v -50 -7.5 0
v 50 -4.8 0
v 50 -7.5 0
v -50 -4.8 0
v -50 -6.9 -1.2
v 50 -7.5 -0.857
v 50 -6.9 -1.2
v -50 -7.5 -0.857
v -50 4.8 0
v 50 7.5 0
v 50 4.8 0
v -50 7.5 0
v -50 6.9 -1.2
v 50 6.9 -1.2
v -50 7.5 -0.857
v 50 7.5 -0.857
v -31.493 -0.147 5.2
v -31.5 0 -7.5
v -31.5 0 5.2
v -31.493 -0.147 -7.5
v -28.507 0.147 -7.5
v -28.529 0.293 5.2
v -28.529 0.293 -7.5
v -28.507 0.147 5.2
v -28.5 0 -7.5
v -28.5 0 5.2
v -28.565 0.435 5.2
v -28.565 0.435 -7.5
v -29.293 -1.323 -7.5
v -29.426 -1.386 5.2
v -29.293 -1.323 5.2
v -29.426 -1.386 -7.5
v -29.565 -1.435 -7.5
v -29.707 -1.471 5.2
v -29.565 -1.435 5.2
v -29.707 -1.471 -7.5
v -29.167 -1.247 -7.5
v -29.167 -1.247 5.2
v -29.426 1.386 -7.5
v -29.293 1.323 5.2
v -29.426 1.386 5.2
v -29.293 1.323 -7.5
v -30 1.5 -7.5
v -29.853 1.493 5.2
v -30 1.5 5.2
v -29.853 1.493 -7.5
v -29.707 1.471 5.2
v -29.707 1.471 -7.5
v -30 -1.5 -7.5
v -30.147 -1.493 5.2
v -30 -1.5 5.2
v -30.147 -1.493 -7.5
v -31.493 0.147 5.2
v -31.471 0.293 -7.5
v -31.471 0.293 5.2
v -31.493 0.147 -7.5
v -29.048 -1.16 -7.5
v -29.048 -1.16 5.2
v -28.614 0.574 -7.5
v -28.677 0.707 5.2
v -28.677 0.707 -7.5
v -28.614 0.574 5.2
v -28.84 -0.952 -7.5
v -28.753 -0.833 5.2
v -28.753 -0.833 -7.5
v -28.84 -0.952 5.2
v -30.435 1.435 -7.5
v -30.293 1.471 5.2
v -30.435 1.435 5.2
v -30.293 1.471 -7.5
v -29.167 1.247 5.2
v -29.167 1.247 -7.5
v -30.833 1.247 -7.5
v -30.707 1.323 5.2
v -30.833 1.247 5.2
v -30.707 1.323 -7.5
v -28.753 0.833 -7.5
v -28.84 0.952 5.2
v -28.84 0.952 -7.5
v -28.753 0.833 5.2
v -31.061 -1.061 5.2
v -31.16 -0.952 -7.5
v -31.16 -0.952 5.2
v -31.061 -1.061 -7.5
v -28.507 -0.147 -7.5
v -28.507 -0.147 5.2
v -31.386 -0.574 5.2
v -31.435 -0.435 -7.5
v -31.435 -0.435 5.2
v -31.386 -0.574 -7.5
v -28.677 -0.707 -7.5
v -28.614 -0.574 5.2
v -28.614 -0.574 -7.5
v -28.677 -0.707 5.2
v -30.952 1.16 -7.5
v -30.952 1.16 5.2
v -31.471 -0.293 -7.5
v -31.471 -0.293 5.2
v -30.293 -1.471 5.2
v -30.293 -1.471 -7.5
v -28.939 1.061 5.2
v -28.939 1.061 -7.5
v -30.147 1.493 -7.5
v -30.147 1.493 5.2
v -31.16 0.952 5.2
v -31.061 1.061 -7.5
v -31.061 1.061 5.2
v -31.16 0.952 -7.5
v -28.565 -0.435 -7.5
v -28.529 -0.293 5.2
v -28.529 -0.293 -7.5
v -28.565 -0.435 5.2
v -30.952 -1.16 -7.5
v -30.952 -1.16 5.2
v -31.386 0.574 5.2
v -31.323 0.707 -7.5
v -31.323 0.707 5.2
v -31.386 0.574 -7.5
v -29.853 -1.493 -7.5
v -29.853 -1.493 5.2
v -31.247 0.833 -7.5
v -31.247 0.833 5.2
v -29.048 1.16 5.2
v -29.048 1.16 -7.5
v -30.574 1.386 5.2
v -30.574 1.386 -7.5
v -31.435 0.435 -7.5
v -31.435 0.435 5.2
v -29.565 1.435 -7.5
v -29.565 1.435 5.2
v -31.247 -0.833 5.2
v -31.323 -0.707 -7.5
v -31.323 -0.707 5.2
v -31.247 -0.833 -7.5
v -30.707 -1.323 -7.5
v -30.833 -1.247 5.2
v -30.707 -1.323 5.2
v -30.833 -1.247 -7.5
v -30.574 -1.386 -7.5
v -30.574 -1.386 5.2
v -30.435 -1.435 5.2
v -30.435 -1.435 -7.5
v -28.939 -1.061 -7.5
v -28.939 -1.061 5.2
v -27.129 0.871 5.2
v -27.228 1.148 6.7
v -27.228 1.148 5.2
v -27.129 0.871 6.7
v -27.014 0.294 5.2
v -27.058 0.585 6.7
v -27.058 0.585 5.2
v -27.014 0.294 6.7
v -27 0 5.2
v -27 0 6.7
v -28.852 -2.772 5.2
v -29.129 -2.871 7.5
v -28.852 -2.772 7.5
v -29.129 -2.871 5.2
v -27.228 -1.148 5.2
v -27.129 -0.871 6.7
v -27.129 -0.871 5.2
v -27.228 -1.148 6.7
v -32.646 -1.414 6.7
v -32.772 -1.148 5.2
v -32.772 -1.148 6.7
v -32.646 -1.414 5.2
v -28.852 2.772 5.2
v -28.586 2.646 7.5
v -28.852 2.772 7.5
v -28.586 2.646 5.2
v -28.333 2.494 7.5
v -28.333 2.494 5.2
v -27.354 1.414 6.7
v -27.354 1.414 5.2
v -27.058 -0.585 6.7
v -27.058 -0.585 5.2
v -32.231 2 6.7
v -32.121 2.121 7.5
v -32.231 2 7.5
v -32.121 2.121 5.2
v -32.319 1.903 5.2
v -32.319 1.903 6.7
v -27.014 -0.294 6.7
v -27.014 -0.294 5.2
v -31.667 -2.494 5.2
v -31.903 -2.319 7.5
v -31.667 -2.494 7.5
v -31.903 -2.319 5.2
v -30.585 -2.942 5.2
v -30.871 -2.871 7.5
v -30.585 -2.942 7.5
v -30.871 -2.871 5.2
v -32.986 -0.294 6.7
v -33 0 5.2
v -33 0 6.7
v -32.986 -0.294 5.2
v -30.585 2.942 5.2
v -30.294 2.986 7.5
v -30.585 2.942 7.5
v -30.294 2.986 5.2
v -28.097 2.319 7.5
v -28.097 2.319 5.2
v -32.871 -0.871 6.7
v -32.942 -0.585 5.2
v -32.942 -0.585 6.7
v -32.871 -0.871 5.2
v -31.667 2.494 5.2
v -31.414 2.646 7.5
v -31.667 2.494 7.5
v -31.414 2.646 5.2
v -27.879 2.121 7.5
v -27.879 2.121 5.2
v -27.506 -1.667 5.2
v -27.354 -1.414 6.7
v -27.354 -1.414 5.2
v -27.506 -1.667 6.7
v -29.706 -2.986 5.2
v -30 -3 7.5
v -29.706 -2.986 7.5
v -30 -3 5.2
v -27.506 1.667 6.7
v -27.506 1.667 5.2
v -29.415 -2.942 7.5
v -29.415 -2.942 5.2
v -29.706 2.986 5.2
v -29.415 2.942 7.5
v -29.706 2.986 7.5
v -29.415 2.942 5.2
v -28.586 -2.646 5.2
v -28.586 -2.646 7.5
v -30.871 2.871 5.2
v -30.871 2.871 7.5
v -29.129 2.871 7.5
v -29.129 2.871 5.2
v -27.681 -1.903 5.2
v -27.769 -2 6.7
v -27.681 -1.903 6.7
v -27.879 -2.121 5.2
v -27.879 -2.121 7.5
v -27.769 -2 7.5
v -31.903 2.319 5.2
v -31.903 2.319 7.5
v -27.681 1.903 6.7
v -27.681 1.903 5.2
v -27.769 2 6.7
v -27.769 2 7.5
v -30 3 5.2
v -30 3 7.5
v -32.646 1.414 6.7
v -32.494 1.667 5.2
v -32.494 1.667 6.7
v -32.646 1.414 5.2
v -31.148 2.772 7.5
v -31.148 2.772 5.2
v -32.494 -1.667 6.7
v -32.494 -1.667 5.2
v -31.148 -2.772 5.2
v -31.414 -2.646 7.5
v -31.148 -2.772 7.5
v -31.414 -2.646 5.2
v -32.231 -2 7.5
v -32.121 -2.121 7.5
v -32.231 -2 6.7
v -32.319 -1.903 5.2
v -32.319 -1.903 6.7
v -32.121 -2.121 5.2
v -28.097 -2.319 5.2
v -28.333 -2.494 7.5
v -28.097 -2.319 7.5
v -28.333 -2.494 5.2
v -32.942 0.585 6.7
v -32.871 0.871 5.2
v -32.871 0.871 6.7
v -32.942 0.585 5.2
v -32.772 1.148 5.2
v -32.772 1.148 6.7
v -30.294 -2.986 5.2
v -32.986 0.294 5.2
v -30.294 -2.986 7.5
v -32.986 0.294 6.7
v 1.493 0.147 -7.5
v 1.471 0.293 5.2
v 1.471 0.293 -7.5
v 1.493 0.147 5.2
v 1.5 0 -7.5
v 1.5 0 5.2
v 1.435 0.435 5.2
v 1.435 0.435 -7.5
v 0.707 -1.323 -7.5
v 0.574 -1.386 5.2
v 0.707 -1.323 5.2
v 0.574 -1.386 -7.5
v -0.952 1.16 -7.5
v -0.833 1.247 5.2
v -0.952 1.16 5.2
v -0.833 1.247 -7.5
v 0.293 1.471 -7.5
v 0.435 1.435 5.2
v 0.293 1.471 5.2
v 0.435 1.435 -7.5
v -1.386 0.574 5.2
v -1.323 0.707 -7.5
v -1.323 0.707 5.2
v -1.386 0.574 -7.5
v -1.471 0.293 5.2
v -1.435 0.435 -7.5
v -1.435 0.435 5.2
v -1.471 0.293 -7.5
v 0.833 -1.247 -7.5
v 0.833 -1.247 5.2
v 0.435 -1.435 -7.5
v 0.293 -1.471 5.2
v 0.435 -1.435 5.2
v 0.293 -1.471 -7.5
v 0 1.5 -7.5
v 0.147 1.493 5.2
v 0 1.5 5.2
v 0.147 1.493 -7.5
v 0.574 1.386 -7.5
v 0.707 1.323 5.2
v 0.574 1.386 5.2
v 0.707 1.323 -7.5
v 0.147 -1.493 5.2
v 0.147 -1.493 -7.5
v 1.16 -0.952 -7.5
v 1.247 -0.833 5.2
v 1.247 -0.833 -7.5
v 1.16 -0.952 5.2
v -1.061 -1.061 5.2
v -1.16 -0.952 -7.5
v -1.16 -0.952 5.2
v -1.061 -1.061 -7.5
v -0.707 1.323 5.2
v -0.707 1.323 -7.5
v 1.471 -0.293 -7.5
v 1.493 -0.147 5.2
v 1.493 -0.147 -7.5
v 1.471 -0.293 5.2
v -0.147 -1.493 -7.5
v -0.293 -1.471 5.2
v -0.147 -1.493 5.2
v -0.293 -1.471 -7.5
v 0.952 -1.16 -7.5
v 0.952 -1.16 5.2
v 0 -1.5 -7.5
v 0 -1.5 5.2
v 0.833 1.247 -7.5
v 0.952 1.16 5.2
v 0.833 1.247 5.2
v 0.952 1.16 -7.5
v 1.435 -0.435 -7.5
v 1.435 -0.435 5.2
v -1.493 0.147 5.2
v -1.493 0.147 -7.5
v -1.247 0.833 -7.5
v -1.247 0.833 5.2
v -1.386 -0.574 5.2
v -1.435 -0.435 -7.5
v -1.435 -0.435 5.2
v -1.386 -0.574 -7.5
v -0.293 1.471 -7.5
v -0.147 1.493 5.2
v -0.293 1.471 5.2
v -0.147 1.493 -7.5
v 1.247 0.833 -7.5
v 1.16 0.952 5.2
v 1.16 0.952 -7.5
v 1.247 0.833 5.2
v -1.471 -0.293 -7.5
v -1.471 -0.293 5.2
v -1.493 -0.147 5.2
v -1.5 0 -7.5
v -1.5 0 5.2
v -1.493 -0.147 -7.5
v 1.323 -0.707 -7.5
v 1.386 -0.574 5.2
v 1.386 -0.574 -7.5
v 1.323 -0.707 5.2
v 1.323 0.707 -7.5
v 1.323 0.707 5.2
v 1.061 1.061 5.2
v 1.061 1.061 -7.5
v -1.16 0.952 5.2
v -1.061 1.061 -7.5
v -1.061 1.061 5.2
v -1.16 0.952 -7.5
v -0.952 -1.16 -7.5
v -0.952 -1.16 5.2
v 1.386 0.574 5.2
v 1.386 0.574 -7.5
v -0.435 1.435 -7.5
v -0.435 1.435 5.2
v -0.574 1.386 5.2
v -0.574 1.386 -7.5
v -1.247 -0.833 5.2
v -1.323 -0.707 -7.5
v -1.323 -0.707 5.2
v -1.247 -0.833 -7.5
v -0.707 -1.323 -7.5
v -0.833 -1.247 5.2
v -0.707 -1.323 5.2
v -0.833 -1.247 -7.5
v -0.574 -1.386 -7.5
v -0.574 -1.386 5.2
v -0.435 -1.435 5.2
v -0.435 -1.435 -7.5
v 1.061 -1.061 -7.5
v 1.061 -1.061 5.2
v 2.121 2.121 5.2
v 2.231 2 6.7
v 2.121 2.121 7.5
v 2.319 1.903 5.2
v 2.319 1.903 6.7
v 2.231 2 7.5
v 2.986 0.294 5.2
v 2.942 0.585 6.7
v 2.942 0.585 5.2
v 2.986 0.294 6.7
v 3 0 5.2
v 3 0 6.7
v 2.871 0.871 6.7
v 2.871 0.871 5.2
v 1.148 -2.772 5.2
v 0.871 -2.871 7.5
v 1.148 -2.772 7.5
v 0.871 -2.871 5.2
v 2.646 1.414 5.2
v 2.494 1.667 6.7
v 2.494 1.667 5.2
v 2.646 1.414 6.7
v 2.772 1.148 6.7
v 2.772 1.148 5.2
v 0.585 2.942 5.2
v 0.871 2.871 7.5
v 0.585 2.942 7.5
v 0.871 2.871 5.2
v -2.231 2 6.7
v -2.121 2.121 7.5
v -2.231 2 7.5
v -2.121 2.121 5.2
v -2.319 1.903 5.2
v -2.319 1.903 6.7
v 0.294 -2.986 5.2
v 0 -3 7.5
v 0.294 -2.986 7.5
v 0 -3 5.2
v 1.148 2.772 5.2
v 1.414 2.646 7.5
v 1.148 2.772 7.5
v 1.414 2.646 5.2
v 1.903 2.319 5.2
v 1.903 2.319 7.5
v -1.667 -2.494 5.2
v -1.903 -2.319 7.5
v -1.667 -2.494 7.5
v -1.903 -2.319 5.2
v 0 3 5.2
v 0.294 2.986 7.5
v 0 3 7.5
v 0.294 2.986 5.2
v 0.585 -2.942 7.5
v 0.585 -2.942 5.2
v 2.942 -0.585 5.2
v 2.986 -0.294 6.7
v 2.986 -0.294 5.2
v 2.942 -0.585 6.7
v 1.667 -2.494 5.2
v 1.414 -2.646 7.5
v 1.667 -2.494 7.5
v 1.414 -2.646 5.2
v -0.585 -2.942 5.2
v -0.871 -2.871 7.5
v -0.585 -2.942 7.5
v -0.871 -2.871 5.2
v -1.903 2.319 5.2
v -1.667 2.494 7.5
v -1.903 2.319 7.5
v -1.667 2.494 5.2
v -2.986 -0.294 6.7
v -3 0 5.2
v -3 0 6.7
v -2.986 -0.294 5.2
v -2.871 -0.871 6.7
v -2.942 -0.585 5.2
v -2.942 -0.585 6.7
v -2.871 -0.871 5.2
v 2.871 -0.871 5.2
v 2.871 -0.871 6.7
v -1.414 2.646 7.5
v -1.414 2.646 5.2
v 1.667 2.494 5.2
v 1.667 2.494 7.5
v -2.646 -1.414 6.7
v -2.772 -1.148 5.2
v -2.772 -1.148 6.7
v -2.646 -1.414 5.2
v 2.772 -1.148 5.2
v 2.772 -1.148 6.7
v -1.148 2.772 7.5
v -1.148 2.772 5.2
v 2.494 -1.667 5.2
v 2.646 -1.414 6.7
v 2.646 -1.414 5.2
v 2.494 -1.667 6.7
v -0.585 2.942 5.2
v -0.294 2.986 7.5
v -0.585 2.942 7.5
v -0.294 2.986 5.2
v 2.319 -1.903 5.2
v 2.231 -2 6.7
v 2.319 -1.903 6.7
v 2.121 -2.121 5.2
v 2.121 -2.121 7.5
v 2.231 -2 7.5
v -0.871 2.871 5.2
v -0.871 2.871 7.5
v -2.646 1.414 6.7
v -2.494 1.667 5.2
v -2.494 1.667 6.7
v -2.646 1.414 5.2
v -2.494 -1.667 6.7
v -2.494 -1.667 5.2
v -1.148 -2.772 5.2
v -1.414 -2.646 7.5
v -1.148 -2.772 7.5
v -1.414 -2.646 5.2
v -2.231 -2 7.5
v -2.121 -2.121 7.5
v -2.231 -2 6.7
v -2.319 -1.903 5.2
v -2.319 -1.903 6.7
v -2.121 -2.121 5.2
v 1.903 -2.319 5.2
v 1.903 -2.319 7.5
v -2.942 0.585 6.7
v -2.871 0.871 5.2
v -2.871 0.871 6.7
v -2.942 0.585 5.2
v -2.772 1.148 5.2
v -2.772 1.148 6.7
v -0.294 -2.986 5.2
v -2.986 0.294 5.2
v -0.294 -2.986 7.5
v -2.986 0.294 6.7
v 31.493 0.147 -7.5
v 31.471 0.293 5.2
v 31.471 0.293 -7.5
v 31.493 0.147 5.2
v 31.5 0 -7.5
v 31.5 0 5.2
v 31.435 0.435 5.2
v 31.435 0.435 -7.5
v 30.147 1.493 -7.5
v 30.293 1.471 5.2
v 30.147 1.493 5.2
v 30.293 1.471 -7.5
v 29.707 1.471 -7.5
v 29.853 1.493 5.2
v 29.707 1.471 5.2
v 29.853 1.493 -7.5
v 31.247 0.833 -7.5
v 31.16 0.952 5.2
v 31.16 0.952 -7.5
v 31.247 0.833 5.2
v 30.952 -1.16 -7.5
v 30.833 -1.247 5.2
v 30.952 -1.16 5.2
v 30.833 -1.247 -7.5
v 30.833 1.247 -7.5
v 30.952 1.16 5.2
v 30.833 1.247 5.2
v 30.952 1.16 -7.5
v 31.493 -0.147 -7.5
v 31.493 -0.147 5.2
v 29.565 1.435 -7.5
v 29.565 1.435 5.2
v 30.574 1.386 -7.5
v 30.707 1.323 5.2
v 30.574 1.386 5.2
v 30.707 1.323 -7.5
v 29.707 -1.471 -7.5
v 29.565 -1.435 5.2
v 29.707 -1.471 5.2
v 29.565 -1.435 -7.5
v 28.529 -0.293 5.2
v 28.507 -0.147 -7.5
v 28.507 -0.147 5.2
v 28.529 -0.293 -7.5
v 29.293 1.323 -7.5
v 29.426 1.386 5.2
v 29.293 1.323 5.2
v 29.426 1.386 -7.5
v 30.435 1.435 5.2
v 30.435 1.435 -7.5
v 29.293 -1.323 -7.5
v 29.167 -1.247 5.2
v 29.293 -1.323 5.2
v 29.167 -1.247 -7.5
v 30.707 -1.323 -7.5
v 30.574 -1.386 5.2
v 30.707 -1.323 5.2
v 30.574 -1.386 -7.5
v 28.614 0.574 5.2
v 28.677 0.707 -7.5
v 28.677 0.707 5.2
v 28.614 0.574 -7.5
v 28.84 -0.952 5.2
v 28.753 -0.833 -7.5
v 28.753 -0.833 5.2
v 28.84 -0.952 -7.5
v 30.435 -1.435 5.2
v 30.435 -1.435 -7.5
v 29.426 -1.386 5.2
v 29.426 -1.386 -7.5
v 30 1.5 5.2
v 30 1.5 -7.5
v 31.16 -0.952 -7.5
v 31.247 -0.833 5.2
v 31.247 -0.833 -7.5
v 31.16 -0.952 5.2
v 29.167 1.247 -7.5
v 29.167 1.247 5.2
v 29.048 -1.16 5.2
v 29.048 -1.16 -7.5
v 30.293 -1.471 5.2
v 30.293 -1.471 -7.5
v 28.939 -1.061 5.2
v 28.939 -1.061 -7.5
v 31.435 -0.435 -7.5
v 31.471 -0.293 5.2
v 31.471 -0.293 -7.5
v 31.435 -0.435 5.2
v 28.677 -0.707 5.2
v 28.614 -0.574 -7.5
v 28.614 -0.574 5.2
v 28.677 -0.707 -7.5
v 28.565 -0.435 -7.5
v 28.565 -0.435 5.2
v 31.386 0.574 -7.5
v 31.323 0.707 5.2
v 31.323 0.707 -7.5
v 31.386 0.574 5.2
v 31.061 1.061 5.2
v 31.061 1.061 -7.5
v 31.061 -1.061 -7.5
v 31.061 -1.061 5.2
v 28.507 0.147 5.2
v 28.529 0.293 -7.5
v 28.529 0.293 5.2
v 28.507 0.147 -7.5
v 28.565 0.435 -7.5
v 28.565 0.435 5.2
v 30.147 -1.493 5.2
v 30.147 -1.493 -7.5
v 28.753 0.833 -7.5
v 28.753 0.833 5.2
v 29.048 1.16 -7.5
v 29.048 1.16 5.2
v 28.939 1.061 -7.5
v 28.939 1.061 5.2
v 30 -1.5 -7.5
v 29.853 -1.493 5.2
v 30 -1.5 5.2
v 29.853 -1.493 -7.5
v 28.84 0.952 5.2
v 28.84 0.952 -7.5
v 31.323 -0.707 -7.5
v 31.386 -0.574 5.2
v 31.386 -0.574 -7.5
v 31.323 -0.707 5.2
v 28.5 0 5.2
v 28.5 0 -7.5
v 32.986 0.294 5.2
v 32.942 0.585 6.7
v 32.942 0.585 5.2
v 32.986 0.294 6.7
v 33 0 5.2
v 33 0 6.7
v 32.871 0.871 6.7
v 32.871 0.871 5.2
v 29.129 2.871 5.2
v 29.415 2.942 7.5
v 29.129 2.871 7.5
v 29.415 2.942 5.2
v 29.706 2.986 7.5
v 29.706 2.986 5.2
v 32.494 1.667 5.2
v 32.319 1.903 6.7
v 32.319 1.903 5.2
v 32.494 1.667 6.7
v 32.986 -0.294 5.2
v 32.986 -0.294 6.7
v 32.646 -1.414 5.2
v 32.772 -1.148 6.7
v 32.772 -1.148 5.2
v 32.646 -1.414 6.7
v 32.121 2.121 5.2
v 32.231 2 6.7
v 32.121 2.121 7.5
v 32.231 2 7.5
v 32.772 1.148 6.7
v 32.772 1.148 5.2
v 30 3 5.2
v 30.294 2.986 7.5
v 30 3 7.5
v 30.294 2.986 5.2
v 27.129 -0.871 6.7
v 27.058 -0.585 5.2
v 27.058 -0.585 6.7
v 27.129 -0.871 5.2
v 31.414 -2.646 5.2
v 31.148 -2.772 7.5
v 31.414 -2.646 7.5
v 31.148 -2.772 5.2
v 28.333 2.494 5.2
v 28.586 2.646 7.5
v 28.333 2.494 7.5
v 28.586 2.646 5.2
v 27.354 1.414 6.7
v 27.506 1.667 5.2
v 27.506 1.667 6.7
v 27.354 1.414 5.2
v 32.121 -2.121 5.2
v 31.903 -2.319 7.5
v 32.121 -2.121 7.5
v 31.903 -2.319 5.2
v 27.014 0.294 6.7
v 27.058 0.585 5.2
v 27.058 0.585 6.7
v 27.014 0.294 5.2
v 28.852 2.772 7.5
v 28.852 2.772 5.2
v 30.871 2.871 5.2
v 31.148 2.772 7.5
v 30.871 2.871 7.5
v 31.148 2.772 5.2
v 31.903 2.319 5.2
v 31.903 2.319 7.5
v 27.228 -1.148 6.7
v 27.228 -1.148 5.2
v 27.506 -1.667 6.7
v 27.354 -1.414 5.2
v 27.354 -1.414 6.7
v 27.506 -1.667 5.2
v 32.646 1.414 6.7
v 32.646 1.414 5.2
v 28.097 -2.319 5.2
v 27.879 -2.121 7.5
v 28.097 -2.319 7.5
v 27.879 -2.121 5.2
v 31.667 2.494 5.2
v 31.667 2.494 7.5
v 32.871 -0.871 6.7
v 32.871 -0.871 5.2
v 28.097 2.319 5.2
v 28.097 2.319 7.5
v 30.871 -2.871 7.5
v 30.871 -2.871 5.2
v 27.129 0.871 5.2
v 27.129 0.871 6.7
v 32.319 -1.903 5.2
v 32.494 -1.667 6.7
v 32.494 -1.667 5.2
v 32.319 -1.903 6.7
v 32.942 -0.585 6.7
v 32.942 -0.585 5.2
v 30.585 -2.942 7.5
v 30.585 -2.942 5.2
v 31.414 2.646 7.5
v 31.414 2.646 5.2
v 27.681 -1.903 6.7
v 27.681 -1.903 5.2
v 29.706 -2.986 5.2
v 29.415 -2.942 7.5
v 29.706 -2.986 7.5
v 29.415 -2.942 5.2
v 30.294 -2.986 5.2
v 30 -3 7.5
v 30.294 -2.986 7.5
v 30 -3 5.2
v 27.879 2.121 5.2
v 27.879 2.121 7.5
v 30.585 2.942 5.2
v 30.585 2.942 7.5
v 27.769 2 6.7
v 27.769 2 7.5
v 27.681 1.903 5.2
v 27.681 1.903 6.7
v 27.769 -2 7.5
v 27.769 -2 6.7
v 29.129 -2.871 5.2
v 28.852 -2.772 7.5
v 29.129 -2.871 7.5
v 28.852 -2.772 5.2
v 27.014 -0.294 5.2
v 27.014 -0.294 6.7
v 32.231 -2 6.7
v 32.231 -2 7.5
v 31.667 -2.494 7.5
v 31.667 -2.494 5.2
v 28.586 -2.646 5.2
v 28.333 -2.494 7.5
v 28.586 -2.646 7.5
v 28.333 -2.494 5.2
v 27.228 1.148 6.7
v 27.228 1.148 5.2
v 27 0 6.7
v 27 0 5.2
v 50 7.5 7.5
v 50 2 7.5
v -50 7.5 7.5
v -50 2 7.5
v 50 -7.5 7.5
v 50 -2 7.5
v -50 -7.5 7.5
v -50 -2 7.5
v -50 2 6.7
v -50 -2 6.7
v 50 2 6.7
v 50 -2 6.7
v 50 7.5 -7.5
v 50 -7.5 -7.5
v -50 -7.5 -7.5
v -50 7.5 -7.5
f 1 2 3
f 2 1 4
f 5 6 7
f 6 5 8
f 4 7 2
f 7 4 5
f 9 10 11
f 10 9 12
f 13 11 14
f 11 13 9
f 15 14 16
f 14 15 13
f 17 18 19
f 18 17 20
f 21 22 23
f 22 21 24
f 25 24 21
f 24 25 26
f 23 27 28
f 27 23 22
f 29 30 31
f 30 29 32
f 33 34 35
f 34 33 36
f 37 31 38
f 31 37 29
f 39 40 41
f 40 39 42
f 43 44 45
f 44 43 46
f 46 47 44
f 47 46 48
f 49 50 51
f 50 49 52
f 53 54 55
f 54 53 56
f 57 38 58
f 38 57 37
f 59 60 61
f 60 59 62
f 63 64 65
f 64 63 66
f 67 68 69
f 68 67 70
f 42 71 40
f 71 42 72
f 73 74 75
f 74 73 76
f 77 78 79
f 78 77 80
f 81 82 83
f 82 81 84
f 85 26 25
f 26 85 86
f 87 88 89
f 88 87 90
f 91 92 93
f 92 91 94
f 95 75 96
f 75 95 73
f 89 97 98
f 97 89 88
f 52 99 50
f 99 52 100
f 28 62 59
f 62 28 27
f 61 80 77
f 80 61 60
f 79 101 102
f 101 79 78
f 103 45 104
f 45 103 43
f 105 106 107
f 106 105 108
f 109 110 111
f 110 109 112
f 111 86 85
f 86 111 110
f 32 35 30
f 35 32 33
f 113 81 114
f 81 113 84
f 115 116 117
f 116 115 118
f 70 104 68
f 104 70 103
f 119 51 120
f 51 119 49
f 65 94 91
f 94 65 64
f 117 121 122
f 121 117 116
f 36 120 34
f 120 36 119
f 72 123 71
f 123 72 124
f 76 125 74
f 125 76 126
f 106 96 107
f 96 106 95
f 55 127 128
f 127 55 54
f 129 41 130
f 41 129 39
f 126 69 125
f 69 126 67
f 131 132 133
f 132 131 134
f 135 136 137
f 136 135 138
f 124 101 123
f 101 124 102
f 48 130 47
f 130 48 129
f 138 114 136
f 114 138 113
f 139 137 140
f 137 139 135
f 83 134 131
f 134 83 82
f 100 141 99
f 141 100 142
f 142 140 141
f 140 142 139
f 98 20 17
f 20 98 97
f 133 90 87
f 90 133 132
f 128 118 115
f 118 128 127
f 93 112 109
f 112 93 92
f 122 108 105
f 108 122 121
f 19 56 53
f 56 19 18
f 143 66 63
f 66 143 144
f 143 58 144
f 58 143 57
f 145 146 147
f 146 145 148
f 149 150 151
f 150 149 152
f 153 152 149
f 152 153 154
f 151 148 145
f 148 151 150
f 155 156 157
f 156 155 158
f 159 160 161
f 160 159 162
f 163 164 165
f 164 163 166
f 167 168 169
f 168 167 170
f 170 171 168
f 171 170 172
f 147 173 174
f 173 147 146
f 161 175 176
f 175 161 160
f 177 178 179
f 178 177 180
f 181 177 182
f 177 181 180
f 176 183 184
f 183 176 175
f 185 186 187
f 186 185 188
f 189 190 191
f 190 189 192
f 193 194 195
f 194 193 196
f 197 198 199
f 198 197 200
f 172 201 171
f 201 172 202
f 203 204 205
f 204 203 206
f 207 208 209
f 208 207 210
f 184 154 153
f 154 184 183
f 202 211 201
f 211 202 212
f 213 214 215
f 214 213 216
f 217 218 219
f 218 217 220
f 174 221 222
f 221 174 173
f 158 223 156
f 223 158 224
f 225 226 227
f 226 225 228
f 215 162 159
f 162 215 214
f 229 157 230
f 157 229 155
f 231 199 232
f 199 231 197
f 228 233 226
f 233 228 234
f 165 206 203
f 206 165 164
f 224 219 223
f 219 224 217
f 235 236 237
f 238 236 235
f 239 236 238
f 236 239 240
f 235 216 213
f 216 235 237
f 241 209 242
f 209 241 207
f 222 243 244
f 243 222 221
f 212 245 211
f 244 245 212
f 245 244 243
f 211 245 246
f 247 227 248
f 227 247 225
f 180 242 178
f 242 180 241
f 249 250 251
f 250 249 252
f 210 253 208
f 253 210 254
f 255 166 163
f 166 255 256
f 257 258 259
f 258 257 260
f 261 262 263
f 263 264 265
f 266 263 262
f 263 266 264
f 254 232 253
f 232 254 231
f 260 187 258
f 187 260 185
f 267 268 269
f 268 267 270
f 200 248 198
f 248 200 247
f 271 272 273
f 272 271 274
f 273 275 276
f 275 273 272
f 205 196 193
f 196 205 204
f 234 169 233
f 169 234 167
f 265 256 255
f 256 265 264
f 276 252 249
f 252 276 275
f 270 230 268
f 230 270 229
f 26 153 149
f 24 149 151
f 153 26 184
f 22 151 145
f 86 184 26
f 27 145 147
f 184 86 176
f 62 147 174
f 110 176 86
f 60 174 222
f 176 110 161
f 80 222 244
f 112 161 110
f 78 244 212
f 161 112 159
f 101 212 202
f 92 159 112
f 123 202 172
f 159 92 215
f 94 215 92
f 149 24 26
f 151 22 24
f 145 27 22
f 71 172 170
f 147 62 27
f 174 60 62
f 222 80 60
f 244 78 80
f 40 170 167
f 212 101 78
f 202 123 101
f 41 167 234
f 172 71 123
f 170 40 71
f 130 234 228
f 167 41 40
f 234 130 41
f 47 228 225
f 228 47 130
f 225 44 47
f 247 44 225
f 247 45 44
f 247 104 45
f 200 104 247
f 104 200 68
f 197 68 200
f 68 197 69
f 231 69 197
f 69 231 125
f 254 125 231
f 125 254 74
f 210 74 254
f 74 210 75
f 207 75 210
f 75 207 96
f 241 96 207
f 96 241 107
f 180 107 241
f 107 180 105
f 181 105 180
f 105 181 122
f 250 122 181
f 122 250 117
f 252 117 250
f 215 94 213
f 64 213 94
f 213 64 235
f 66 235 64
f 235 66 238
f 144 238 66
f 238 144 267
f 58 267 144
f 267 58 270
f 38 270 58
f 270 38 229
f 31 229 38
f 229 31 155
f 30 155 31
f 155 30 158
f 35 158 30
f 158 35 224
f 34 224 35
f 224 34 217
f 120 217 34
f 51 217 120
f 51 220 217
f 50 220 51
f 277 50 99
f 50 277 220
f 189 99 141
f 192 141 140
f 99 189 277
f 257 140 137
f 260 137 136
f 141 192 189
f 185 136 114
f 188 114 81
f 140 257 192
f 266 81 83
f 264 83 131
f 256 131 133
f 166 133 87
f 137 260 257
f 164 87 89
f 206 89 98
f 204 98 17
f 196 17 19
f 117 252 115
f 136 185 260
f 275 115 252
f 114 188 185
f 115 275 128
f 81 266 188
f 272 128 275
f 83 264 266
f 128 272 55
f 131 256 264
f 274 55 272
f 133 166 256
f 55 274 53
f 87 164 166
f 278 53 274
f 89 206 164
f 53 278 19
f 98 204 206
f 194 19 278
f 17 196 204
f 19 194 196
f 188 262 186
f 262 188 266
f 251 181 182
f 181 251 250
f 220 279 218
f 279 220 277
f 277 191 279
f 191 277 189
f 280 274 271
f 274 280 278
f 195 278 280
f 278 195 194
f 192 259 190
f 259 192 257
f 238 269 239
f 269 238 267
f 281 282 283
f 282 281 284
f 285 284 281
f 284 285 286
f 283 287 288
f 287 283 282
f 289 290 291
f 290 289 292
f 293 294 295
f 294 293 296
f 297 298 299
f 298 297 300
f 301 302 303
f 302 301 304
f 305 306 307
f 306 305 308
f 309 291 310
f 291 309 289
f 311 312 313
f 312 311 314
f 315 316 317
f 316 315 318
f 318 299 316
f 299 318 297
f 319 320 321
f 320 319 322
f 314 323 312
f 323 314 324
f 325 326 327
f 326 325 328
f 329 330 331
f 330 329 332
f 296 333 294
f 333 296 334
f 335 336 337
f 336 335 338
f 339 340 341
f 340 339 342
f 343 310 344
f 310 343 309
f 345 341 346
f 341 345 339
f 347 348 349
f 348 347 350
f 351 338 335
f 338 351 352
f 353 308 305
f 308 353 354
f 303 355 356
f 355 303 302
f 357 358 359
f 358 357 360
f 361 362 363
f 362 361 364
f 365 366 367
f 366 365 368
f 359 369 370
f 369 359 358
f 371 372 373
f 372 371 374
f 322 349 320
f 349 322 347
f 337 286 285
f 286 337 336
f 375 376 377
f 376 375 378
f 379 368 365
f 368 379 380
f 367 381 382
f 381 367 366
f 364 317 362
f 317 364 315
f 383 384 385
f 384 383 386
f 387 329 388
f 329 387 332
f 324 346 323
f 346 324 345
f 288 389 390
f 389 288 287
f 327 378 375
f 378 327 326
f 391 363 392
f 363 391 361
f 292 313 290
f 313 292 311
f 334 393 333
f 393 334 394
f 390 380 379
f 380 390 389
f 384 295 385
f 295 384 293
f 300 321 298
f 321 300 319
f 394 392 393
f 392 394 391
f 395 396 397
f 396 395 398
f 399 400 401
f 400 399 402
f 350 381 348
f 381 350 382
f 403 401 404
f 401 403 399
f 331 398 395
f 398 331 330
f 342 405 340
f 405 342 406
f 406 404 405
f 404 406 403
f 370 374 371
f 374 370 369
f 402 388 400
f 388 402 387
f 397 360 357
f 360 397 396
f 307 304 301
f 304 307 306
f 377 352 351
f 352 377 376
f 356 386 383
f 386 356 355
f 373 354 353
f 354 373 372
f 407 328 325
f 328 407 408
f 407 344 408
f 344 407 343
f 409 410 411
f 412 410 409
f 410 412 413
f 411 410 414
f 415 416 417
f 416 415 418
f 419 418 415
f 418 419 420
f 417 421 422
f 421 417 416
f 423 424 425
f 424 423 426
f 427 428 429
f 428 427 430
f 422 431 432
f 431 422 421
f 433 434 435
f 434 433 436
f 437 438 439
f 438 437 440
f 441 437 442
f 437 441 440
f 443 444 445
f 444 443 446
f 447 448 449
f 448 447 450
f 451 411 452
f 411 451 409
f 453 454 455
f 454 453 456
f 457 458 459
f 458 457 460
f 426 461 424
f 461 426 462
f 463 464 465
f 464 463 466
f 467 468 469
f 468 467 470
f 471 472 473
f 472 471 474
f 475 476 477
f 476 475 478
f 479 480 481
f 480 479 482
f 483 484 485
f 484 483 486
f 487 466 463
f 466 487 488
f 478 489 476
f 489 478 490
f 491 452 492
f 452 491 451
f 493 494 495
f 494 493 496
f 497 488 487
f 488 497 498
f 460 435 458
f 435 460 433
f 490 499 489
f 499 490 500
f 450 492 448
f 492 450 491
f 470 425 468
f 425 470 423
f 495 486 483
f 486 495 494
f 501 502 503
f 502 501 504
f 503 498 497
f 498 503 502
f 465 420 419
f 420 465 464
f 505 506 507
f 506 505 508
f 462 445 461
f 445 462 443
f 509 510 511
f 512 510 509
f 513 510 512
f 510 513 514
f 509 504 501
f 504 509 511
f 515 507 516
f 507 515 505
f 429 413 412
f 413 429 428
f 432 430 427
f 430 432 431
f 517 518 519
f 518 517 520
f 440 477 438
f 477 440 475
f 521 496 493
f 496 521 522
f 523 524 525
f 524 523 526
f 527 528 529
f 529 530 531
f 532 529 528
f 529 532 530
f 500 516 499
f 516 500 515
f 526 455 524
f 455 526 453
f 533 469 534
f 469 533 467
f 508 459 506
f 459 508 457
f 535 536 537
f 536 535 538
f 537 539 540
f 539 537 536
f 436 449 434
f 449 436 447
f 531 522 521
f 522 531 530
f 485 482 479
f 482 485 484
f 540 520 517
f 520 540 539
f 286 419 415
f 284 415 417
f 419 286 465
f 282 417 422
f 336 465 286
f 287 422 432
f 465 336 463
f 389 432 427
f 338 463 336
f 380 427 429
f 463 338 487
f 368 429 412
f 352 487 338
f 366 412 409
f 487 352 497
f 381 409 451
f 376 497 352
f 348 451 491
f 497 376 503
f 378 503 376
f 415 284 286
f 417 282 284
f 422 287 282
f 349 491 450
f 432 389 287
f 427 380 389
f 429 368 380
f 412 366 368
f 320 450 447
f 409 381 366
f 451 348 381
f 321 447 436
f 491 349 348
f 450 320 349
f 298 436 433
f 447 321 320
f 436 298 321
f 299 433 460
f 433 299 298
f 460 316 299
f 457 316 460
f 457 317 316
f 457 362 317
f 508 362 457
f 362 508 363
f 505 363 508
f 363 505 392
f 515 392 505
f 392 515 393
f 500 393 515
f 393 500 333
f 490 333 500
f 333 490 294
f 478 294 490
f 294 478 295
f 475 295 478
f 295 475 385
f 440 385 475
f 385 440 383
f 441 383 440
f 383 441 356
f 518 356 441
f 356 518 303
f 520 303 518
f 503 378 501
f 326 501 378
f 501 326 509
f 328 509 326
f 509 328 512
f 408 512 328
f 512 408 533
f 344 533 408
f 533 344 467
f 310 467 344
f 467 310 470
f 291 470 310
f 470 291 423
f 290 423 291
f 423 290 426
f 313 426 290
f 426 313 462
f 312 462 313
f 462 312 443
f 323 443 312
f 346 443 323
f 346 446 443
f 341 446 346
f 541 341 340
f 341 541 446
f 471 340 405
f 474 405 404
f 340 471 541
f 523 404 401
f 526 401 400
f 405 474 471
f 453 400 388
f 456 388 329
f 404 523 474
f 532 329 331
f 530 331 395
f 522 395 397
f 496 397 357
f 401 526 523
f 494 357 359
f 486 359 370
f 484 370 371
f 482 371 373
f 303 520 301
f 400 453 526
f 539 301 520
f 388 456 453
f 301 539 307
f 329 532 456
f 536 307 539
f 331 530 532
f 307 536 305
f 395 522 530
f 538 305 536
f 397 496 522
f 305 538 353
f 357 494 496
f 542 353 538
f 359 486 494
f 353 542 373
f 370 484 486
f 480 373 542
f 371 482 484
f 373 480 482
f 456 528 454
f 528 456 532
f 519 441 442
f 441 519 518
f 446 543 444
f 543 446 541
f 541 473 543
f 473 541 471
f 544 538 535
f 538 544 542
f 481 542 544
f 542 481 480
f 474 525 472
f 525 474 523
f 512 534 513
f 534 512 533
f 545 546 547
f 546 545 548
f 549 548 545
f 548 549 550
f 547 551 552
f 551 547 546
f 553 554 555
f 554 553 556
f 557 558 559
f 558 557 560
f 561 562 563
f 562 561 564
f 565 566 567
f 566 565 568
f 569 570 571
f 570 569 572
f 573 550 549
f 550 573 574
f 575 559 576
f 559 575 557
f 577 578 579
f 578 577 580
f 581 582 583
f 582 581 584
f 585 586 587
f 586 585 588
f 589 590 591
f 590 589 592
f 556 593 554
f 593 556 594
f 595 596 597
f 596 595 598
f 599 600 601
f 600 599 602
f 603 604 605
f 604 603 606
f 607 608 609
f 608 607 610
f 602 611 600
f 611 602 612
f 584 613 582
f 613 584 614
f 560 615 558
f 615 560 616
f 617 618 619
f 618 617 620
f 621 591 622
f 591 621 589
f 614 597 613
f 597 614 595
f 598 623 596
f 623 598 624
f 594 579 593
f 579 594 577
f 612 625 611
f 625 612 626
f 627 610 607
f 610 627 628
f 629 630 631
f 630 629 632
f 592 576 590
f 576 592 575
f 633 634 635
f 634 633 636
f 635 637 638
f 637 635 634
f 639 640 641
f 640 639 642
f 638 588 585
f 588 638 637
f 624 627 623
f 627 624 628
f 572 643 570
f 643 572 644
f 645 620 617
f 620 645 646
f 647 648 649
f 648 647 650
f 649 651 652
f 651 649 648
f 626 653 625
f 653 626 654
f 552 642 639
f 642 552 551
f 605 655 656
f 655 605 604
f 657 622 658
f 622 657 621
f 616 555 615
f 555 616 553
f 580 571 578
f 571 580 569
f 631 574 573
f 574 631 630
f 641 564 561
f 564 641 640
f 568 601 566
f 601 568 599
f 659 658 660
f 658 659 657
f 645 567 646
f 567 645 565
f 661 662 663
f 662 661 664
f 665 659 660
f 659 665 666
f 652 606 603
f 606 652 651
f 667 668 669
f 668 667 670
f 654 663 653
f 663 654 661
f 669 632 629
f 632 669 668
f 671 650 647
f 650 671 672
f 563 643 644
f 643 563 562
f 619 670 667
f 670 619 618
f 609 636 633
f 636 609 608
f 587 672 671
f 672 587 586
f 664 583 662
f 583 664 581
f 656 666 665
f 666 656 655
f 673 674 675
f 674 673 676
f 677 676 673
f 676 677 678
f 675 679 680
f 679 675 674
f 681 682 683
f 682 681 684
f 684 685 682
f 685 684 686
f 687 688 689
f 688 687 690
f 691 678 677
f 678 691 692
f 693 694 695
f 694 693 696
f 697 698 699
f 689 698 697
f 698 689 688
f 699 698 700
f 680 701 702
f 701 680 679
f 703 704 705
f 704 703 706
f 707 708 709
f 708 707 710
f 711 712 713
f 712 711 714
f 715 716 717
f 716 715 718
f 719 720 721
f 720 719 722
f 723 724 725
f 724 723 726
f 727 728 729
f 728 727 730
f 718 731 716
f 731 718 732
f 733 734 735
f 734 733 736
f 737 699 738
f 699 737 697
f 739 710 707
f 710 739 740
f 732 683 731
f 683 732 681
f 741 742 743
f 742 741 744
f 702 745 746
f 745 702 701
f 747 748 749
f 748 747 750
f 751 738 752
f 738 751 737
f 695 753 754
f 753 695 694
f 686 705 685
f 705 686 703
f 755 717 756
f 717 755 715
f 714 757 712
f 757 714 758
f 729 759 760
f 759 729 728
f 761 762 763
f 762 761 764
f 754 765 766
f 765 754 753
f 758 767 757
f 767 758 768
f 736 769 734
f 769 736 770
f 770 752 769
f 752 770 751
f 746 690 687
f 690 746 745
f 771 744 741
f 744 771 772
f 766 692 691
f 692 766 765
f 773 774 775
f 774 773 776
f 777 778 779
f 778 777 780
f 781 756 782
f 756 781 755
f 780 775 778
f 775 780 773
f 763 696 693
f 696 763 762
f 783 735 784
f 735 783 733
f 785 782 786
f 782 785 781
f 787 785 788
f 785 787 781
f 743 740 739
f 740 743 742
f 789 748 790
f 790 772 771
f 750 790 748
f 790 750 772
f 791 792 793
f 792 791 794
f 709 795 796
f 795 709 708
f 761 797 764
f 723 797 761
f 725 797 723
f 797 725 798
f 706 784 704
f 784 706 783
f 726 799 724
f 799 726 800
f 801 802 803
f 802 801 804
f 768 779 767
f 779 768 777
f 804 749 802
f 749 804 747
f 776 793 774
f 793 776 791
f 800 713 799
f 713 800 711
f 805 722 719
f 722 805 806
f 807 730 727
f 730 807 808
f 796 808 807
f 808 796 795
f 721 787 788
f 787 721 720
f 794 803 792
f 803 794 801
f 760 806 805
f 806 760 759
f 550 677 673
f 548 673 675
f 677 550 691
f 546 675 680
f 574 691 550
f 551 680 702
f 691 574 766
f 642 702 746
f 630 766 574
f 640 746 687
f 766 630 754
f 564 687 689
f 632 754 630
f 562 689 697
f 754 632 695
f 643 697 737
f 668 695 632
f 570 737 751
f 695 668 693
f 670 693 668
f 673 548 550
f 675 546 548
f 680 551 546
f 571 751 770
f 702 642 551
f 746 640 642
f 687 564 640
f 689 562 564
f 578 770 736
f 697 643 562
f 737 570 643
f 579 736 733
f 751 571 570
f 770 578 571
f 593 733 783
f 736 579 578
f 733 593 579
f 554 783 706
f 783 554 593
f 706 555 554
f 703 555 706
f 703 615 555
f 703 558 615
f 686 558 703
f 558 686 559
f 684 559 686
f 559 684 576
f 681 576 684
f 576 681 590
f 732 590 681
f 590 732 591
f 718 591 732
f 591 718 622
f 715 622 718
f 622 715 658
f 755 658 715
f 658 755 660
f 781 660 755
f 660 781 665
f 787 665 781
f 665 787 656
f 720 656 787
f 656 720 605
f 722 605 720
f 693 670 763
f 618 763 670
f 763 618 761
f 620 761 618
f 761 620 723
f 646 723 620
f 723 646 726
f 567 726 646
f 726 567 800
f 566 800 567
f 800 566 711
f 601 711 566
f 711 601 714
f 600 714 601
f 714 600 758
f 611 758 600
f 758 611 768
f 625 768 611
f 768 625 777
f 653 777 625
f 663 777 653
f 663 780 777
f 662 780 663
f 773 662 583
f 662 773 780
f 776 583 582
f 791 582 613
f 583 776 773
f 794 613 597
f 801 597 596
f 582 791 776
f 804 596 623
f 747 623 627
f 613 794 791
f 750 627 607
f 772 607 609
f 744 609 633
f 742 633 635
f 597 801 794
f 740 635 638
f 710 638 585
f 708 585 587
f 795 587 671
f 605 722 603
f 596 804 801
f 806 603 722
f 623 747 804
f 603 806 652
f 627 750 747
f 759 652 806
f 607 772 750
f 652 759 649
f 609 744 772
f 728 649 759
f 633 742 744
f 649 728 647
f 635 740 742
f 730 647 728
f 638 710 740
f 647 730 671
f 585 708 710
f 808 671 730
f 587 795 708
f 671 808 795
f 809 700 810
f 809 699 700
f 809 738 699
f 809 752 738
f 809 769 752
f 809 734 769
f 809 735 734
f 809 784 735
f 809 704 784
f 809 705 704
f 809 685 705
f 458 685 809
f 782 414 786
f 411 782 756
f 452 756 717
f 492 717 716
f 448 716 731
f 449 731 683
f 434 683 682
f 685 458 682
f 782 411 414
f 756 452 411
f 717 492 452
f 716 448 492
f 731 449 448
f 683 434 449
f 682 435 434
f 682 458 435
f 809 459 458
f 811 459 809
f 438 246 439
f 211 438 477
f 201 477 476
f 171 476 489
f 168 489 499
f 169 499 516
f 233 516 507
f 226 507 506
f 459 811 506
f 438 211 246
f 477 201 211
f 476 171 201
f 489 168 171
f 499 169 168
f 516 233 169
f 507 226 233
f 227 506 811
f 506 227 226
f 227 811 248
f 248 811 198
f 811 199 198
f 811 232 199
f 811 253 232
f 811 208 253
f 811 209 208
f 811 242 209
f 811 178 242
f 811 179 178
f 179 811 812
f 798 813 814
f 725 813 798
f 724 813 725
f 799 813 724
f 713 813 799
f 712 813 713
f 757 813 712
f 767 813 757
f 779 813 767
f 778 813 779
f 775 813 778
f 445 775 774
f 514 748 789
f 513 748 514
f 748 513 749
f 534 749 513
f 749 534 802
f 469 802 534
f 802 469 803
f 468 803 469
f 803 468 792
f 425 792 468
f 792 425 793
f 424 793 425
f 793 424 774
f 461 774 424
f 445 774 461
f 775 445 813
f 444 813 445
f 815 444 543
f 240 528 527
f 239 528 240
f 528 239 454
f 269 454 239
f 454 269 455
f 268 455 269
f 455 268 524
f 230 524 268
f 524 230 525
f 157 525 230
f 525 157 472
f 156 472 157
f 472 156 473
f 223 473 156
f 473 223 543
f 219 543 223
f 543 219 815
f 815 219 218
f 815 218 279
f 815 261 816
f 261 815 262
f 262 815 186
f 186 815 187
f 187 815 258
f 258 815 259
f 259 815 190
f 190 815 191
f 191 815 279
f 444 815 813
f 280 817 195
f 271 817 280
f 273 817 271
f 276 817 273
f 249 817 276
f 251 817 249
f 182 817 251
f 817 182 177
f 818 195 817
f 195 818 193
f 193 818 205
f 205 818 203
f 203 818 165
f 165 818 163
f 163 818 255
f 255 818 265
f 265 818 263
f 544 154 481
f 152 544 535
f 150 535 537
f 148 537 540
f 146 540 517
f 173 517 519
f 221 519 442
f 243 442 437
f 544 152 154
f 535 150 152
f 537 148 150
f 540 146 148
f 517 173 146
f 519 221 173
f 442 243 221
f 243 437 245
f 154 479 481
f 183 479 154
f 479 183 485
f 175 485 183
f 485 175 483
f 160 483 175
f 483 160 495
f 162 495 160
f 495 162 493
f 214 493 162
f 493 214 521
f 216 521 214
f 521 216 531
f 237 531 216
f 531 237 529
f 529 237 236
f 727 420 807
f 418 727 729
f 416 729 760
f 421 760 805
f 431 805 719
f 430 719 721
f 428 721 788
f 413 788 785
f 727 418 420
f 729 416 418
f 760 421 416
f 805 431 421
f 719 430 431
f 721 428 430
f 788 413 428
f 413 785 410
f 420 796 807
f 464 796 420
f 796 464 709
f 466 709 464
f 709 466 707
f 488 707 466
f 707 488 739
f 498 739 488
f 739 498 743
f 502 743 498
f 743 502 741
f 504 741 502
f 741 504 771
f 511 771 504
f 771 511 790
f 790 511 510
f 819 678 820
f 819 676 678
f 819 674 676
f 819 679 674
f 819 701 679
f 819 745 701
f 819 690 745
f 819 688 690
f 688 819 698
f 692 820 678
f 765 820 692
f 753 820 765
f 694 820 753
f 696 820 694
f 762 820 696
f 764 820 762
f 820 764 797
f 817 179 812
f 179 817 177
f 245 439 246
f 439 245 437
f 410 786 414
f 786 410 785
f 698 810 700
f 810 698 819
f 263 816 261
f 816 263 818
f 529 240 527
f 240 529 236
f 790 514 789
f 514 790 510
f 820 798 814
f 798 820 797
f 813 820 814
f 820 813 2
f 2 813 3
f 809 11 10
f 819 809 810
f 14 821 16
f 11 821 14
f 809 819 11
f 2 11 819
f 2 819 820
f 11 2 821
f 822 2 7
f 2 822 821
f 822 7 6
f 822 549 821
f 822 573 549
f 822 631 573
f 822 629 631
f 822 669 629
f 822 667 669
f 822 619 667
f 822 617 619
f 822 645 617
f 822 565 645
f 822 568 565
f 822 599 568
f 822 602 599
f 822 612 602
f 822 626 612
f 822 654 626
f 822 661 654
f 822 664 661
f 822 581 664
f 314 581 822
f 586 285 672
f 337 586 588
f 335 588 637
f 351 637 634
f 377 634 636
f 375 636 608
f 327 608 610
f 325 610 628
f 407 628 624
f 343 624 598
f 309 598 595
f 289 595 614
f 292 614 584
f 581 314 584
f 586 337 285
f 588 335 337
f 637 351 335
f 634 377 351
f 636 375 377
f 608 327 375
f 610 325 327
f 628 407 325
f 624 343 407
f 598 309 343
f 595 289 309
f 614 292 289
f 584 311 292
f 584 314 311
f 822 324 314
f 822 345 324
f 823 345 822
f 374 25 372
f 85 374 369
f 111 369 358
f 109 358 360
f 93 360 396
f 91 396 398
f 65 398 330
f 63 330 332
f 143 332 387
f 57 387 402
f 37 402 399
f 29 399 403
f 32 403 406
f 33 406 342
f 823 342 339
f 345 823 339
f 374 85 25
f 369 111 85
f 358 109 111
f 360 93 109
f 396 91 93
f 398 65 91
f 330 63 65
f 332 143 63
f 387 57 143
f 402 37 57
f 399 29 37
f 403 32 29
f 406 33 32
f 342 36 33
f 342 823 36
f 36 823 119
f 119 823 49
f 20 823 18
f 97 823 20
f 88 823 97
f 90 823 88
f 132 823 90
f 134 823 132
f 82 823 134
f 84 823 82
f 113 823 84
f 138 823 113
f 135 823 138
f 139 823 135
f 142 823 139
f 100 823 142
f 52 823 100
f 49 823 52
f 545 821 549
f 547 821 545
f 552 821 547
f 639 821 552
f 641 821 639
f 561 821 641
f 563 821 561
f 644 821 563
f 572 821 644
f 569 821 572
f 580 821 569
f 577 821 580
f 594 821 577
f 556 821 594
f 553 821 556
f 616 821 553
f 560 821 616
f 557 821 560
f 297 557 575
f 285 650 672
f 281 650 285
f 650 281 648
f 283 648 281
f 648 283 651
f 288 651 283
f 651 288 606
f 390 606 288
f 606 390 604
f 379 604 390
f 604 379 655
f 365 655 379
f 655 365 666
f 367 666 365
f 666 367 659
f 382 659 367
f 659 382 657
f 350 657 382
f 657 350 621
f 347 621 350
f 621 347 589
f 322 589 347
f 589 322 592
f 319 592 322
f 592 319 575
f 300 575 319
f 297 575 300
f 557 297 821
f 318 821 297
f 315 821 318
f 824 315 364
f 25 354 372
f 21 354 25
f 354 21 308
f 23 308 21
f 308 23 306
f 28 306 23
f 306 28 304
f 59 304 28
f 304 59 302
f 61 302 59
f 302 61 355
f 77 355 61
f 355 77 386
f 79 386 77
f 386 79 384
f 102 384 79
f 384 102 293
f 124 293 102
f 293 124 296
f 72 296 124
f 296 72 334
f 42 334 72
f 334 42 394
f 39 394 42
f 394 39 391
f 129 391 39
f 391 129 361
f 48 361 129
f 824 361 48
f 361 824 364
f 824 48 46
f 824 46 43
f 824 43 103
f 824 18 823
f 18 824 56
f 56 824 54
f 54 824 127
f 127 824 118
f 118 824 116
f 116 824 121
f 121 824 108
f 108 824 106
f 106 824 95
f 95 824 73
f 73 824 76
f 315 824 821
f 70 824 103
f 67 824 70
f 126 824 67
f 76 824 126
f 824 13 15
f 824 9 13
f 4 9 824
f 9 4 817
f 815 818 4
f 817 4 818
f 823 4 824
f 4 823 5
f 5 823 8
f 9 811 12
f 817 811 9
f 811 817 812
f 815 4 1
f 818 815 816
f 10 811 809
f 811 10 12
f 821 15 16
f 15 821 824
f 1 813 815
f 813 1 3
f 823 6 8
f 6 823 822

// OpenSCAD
// Miniature linear guide rail: 15mm wide, 15mm tall, 100mm long
// One connected solid; no text; all features derived from dimensions.

$fn = 64;

L = 100;
W = 15;
H = 15;

module linear_guide_rail() {
    difference() {
        rail_solid();
        rail_cuts();
    }
}

module rail_solid() {
    // Centered for easier feature placement
    translate([0, 0, 0])
        cube([L, W, H], center=true);
}

module rail_cuts() {
    // Side raceway grooves (V-ish channels) along full length
    groove_depth = 1.2;
    groove_height = 4.2;
    groove_y = W/2 - 0.6; // near side faces
    groove_z = 0;         // centered vertically

    for (sy = [-1, 1]) {
        translate([0, sy*groove_y, groove_z])
            rotate([0, 90, 0])
                linear_extrude(height=L + 0.4, center=true, convexity=10)
                    polygon(points=[
                        [0,  groove_height/2],
                        [groove_depth, 0],
                        [0, -groove_height/2]
                    ]);
    }

    // Top center relief groove (shallow)
    top_groove_w = 4.0;
    top_groove_d = 0.8;
    translate([0, 0, H/2 - top_groove_d/2])
        cube([L + 0.4, top_groove_w, top_groove_d], center=true);

    // Mounting holes with counterbores (3 holes)
    hole_d = 3.0;
    cbore_d = 6.0;
    cbore_depth = 2.2;

    // Place holes along length with margins derived from L
    x_margin = 20;
    xs = [ -L/2 + x_margin, 0, L/2 - x_margin ];

    for (x = xs) {
        // Through hole (Z axis)
        translate([x, 0, 0])
            cylinder(h=H + 0.6, d=hole_d, center=true);

        // Counterbore from top face
        translate([x, 0, H/2 - cbore_depth/2])
            cylinder(h=cbore_depth + 0.2, d=cbore_d, center=true);
    }

    // End chamfers (small) to avoid razor edges
    cham = 0.8;
    for (sx = [-1, 1]) {
        translate([sx*(L/2 - cham/2), 0, 0])
            rotate([0, 90, 0])
                linear_extrude(height=cham + 0.2, center=true, convexity=10)
                    polygon(points=[
                        [-W/2, -H/2],
                        [ W/2, -H/2],
                        [ W/2,  H/2],
                        [ W/2 - cham, H/2],
                        [ W/2,  H/2 - cham],
                        [-W/2,  H/2]
                    ]);
    }
}

linear_guide_rail();
